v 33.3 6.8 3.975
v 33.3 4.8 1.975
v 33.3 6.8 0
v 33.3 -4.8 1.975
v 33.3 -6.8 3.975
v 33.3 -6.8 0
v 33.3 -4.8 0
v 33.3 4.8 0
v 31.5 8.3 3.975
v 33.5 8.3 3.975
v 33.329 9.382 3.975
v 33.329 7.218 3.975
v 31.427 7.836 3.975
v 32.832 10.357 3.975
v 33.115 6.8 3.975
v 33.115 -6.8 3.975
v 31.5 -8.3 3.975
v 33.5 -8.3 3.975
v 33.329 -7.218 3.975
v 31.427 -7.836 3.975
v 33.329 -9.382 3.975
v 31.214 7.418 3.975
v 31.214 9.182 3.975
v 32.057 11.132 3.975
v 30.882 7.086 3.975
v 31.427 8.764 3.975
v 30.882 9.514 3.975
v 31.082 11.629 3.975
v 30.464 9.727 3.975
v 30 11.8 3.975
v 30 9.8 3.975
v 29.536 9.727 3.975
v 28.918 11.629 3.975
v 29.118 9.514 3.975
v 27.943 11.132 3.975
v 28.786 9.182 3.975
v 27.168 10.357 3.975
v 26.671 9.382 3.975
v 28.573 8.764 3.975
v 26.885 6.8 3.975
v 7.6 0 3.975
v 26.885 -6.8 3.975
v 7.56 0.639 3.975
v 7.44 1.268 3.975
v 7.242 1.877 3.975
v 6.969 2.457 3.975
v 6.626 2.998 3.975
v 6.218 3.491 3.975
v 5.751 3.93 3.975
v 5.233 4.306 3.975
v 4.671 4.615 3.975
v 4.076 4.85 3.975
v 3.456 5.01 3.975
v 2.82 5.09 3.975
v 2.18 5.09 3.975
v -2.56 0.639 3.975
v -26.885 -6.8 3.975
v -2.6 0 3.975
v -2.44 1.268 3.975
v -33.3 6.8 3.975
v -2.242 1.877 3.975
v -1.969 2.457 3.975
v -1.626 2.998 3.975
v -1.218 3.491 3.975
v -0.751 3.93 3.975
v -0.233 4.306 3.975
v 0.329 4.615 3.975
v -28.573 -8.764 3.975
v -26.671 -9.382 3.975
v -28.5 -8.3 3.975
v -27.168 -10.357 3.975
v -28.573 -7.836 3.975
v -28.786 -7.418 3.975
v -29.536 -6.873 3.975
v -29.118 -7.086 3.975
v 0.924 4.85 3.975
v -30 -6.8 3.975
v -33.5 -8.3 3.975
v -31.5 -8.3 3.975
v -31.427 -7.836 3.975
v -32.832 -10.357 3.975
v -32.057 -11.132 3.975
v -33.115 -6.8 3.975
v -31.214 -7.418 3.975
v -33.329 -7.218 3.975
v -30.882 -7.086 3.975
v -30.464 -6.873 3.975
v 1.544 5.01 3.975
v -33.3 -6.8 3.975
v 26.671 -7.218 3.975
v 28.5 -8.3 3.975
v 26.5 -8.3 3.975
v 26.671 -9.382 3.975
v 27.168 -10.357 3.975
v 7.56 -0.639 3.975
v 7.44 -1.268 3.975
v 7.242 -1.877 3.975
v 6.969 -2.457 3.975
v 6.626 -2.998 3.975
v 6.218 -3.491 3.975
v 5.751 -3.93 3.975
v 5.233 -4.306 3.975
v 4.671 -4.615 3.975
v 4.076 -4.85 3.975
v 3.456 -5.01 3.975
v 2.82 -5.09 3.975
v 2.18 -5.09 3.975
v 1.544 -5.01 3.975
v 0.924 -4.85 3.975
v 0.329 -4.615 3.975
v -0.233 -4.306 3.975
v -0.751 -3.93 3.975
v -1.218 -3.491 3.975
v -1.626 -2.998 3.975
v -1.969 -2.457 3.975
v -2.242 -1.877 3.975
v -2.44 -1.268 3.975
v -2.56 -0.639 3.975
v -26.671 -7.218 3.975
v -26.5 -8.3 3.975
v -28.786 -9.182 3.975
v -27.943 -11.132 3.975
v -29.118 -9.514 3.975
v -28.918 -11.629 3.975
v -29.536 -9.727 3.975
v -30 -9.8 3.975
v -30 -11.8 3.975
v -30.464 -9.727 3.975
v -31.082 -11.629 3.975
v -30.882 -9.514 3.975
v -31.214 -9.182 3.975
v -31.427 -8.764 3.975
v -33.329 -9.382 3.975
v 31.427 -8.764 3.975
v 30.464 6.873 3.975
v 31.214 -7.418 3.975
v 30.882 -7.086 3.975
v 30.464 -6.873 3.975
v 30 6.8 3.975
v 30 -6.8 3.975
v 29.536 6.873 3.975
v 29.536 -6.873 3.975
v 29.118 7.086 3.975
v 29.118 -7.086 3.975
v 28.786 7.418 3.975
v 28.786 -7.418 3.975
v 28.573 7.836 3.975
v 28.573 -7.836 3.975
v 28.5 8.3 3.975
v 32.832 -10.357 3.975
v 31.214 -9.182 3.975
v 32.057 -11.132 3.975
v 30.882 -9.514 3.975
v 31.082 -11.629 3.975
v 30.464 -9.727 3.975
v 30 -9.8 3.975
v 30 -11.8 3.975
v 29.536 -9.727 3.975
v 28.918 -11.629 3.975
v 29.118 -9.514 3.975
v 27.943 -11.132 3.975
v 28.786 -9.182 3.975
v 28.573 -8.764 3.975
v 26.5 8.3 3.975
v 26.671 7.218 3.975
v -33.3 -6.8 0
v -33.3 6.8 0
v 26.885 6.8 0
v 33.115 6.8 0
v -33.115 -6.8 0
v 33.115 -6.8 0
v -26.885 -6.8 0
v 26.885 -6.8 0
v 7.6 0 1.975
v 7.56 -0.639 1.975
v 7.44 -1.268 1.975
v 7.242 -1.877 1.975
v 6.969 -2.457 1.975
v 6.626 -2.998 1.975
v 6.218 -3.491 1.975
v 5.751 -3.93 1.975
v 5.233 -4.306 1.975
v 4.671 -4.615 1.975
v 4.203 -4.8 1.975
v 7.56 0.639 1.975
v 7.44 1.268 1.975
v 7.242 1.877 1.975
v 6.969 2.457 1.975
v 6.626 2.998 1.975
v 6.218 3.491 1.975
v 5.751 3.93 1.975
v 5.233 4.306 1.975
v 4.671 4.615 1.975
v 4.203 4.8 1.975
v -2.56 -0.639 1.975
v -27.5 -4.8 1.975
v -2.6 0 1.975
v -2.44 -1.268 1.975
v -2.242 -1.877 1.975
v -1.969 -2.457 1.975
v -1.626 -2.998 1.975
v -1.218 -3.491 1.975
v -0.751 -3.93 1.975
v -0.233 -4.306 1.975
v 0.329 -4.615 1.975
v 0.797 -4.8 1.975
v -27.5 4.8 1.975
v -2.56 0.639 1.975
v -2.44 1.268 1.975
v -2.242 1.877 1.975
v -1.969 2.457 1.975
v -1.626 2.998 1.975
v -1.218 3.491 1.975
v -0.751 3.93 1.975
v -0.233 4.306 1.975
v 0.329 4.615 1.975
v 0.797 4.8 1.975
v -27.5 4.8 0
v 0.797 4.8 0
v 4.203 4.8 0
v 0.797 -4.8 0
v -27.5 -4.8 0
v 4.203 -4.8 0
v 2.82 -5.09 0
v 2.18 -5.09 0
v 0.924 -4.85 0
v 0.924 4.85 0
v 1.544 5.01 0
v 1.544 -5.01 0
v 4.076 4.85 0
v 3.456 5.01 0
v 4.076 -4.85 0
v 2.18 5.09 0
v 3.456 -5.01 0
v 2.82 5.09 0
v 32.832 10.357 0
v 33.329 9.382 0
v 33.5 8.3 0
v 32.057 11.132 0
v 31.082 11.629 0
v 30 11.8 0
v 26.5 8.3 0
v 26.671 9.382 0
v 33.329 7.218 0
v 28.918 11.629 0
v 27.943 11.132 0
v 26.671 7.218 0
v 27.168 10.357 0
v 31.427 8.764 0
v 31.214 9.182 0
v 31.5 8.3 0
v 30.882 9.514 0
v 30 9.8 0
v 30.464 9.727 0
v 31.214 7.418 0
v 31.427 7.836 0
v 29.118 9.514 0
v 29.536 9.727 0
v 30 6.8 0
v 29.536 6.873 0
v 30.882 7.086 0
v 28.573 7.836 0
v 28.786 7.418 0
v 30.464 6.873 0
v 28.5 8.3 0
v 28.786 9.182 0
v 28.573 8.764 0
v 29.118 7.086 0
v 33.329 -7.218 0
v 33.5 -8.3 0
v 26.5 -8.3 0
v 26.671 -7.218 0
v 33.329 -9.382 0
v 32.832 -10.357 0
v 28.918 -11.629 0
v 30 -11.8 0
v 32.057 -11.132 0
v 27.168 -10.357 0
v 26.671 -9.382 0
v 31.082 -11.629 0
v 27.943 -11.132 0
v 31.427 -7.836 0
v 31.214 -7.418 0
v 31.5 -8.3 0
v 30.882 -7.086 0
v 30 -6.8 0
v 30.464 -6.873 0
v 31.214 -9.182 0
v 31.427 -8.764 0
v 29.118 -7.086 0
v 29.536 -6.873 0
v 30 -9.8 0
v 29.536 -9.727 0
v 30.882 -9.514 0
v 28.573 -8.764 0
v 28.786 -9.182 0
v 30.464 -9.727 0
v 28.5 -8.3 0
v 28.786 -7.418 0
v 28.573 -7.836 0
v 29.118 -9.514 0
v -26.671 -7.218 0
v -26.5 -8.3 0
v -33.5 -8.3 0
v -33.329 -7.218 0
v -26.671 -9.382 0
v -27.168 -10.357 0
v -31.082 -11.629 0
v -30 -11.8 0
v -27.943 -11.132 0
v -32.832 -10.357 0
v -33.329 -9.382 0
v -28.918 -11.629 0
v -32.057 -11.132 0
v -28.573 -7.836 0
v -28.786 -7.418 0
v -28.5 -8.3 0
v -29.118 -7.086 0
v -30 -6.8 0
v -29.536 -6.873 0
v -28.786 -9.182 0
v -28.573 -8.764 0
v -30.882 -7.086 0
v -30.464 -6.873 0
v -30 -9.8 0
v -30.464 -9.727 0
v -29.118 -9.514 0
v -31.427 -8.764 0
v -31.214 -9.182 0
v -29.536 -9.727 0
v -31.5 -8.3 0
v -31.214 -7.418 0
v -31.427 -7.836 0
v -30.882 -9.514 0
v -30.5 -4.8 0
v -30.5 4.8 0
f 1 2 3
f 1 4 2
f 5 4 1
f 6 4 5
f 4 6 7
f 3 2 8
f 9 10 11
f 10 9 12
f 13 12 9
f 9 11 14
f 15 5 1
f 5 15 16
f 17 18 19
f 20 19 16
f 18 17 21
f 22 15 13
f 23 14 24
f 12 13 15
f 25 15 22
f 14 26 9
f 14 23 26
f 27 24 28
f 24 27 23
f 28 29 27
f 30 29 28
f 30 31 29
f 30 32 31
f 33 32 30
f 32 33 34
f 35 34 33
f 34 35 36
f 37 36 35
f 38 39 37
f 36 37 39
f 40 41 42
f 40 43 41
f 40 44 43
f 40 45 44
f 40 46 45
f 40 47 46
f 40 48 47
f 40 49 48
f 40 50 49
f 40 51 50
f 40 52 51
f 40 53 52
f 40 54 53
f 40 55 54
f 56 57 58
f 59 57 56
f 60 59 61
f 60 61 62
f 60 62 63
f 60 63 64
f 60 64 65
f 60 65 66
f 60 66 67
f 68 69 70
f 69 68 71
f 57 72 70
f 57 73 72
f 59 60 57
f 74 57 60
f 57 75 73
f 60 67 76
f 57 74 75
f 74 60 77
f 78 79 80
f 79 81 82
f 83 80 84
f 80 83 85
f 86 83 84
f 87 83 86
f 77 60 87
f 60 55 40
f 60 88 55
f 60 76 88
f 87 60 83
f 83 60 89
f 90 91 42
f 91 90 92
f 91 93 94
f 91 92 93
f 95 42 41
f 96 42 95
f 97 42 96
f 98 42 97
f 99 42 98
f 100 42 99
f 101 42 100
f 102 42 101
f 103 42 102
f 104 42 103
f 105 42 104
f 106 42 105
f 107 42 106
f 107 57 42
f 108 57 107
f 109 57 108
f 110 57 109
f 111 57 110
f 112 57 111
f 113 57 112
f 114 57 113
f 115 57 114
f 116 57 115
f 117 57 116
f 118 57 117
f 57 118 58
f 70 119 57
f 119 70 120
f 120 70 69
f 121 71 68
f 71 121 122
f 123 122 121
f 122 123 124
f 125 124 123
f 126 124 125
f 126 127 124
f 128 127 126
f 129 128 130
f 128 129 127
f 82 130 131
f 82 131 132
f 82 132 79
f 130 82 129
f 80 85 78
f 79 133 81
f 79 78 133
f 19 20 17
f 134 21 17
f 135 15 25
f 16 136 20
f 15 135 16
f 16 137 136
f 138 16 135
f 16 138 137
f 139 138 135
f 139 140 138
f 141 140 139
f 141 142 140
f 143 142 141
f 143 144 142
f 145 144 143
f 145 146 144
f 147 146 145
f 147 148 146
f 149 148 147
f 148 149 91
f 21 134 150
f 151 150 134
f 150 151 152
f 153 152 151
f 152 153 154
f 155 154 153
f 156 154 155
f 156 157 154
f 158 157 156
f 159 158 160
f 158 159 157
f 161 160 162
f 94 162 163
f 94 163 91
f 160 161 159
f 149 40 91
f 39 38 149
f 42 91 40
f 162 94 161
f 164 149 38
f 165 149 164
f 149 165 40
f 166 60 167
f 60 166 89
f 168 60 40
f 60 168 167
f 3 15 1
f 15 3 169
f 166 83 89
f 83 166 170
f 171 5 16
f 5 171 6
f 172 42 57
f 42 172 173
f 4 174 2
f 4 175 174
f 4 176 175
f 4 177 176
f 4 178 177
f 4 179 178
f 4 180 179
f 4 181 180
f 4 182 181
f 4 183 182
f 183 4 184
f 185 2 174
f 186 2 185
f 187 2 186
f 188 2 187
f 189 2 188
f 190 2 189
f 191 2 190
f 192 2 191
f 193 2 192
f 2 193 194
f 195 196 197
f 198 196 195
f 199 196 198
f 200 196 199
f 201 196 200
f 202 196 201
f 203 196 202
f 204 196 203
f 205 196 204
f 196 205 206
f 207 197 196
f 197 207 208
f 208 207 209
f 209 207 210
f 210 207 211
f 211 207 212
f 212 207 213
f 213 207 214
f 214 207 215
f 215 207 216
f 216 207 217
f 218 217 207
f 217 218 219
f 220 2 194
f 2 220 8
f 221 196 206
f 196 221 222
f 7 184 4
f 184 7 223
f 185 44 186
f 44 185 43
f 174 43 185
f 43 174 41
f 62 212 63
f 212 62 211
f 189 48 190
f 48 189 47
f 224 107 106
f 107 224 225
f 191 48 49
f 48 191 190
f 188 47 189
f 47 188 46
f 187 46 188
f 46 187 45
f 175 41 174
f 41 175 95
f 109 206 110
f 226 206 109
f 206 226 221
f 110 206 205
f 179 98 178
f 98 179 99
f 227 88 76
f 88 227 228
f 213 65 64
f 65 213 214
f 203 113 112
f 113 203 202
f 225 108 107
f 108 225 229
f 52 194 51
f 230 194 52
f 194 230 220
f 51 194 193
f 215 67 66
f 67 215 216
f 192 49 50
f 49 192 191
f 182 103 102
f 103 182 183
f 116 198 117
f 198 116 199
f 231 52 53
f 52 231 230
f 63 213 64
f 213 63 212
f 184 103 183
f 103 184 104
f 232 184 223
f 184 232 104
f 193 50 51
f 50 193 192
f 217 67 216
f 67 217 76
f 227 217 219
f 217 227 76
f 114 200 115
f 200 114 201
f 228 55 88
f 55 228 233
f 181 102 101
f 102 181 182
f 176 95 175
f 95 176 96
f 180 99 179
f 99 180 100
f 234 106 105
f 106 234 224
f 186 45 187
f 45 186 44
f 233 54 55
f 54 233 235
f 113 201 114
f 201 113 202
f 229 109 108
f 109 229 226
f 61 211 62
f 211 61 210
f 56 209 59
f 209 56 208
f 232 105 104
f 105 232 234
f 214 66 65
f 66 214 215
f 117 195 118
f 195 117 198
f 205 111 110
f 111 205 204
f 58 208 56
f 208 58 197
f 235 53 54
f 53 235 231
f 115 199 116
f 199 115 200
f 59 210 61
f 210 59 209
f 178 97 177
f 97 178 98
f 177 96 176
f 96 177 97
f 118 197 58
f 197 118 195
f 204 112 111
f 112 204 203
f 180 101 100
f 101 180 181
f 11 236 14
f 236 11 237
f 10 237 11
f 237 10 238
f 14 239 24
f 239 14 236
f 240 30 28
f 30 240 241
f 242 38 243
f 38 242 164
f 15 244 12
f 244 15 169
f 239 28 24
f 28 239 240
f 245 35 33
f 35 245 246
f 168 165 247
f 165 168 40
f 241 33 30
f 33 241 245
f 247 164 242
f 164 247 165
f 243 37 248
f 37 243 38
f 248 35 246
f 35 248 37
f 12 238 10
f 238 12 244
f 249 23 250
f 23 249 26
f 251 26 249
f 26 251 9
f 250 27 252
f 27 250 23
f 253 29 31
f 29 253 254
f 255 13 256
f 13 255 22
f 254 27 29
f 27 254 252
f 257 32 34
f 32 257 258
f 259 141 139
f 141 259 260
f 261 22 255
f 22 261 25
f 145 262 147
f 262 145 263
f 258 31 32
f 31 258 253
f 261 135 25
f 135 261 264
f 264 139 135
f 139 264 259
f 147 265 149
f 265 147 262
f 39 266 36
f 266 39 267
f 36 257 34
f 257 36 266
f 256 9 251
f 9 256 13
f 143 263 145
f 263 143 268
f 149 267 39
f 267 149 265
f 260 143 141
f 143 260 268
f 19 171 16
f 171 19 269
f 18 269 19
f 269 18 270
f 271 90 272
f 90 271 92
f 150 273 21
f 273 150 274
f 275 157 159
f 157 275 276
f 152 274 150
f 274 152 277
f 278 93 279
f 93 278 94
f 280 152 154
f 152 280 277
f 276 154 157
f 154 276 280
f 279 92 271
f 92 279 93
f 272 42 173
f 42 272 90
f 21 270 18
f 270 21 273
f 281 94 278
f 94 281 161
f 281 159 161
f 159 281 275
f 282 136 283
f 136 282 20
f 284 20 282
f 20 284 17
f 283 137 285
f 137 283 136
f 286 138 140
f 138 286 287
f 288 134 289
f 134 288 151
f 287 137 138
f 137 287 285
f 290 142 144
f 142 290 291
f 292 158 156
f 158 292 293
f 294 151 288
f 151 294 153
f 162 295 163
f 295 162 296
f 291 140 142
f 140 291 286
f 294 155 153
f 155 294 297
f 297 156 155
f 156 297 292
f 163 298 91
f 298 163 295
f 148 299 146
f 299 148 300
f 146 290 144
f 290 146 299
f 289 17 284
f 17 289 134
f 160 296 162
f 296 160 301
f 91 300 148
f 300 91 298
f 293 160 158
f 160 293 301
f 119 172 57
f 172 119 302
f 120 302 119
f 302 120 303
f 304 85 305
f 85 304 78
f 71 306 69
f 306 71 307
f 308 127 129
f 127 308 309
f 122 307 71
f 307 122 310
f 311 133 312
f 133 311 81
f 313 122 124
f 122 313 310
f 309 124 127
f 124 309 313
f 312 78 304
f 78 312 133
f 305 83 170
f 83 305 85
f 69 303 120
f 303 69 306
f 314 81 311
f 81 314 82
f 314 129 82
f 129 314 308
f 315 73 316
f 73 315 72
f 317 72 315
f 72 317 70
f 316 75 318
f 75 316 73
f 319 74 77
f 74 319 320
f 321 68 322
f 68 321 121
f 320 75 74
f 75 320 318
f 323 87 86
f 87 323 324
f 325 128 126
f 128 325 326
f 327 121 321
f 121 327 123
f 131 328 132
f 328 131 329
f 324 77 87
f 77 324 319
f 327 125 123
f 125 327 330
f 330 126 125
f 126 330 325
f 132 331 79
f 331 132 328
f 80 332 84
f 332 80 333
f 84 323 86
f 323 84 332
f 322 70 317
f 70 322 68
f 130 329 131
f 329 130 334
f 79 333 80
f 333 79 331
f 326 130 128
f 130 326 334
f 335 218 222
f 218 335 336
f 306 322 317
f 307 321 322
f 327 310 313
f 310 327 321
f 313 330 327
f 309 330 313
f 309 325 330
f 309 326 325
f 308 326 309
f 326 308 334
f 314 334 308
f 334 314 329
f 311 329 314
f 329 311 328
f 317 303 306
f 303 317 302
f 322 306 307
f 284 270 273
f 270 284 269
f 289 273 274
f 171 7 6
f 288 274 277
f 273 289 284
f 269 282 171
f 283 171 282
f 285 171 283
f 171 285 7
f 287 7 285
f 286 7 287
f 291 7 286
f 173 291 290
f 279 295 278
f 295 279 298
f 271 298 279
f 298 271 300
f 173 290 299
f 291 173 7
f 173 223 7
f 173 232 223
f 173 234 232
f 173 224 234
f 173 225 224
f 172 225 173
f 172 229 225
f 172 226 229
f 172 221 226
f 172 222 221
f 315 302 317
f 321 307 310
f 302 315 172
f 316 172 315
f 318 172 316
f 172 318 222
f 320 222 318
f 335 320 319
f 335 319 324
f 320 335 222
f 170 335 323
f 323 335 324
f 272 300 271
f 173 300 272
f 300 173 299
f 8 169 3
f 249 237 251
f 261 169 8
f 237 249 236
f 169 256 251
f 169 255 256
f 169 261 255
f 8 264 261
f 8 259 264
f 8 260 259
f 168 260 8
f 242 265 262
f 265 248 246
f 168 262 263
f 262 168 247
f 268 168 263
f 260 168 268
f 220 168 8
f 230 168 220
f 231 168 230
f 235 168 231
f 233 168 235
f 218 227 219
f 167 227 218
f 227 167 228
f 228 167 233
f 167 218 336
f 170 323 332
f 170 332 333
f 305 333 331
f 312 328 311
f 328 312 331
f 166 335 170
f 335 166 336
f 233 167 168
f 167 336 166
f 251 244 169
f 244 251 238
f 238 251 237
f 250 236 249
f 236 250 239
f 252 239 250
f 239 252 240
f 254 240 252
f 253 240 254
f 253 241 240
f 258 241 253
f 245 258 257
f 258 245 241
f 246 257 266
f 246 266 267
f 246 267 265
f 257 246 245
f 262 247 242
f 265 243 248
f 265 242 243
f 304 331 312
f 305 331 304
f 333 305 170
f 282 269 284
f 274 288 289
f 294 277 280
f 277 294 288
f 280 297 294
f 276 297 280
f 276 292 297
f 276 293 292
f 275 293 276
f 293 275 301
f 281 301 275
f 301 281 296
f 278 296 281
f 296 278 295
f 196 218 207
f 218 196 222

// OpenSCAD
//webcamHolder(side="bottom");
webcamHolder(side="top");



module webcamHolder(side="top"){
  fudge = 0.01;
  length = 61;
  width  = 8;
  height = 3.95;
  wallThickess = 2;
  innerClearance= 0.8;
  innerClearanceTopBottom = 0;
  
  camOpticsDia = 10.2;
  camOpticsOffset=28;
  
  mountHolesDia = 2.1;
  mountHoleStartOffset= 7.6;
  mountHolesEndDist = 4;
  
  pcbThickness         = 2;
  pcbFootOutlineHeight = 0.5;
  pcbFootOutlineWidth  = 0.5;
  
  extMountDia = 3;
  
  fullLength = length + ( wallThickess + innerClearance ) *2;
  fullWidth  = width  + ( wallThickess + innerClearance ) *2;
  fullHeight = height + ( wallThickess + innerClearanceTopBottom ) *2;
  
  innerLength = length + ( innerClearance ) *2;
  innerWidth  = width  + ( innerClearance ) *2;
  innerHeight = height + ( innerClearanceTopBottom ) *2;
  
  pcbFootWidth  = width   - pcbFootOutlineWidth*2;
  pcbFootLength = length - pcbFootOutlineHeight*2;
  pcbFootHeight = 3;
  
  echo("fullHeight",fullHeight);
  
  res=50;
  
  
  difference(){
  
    union(){
    
      difference(){
        cube(size=[fullLength, fullWidth, fullHeight],center=true);
        translate([wallThickess, 0, 0])  cube(size=[innerLength+wallThickess, innerWidth, innerHeight],center=true);
        
        translate([length/2-camOpticsOffset, 0, -fudge]) #cylinder(r=camOpticsDia/2,h=fullHeight/2+fudge,$fn=res);
      };

      
      //pcb outline "feet"
      /*translate([0,0,-innerHeight/2+pcbFootOutlineHeight/2]) 
      difference(){
        cube(size=[length, width, pcbFootOutlineHeight],center=true);
        cube(size=[pcbFootLength, pcbFootWidth, pcbFootOutlineHeight],center=true);
      }
      translate([0,0,-innerHeight/2+pcbFootOutlineHeight/2+pcbThickness]) 
      difference(){
        cube(size=[length, width, pcbFootOutlineHeight],center=true);
        cube(size=[pcbFootLength, pcbFootWidth, pcbFootOutlineHeight],center=true);
      }
      */
      
      
      //bolt mount stuff
      translate([30,(fullWidth+extMountDia)/2,0]) mount( od= extMountDia+wallThickess*2, id=extMountDia, h=fullHeight);
      translate([30,-(fullWidth+extMountDia)/2,0]) mount( od= extMountDia+wallThickess*2, id=extMountDia, h=fullHeight);
      
      translate([-30,-(fullWidth+extMountDia)/2,0]) mount( od= extMountDia+wallThickess*2, id=extMountDia, h=fullHeight);
    }
  
    //TODO: UGH openscad old version : no real variables, asignments etc 
    //cutoffset = -3;
    if(side == "top")
    {
      translate([0,0,-3]) #cube([100,50,6],center=true);
    }
    if(side == "bottom")
    {
      translate([0,0,3]) #cube([100,50,6],center=true);
    }
    
    
  }
  
  //pcb foot : should not be cut in half
  if(side == "top"){
    translate([-length/2+1.5,0,+pcbFootHeight/2]) 
    cube(size=[3, innerWidth, pcbFootHeight],center=true);
  }
}


module mount(od=5, id=3, h=10,res=20){

  difference(){
      cylinder(r=od/2,h=h,$fn=res,center=true);
      cylinder(r=id/2,h=h,$fn=res,center=true); 
  }

}
